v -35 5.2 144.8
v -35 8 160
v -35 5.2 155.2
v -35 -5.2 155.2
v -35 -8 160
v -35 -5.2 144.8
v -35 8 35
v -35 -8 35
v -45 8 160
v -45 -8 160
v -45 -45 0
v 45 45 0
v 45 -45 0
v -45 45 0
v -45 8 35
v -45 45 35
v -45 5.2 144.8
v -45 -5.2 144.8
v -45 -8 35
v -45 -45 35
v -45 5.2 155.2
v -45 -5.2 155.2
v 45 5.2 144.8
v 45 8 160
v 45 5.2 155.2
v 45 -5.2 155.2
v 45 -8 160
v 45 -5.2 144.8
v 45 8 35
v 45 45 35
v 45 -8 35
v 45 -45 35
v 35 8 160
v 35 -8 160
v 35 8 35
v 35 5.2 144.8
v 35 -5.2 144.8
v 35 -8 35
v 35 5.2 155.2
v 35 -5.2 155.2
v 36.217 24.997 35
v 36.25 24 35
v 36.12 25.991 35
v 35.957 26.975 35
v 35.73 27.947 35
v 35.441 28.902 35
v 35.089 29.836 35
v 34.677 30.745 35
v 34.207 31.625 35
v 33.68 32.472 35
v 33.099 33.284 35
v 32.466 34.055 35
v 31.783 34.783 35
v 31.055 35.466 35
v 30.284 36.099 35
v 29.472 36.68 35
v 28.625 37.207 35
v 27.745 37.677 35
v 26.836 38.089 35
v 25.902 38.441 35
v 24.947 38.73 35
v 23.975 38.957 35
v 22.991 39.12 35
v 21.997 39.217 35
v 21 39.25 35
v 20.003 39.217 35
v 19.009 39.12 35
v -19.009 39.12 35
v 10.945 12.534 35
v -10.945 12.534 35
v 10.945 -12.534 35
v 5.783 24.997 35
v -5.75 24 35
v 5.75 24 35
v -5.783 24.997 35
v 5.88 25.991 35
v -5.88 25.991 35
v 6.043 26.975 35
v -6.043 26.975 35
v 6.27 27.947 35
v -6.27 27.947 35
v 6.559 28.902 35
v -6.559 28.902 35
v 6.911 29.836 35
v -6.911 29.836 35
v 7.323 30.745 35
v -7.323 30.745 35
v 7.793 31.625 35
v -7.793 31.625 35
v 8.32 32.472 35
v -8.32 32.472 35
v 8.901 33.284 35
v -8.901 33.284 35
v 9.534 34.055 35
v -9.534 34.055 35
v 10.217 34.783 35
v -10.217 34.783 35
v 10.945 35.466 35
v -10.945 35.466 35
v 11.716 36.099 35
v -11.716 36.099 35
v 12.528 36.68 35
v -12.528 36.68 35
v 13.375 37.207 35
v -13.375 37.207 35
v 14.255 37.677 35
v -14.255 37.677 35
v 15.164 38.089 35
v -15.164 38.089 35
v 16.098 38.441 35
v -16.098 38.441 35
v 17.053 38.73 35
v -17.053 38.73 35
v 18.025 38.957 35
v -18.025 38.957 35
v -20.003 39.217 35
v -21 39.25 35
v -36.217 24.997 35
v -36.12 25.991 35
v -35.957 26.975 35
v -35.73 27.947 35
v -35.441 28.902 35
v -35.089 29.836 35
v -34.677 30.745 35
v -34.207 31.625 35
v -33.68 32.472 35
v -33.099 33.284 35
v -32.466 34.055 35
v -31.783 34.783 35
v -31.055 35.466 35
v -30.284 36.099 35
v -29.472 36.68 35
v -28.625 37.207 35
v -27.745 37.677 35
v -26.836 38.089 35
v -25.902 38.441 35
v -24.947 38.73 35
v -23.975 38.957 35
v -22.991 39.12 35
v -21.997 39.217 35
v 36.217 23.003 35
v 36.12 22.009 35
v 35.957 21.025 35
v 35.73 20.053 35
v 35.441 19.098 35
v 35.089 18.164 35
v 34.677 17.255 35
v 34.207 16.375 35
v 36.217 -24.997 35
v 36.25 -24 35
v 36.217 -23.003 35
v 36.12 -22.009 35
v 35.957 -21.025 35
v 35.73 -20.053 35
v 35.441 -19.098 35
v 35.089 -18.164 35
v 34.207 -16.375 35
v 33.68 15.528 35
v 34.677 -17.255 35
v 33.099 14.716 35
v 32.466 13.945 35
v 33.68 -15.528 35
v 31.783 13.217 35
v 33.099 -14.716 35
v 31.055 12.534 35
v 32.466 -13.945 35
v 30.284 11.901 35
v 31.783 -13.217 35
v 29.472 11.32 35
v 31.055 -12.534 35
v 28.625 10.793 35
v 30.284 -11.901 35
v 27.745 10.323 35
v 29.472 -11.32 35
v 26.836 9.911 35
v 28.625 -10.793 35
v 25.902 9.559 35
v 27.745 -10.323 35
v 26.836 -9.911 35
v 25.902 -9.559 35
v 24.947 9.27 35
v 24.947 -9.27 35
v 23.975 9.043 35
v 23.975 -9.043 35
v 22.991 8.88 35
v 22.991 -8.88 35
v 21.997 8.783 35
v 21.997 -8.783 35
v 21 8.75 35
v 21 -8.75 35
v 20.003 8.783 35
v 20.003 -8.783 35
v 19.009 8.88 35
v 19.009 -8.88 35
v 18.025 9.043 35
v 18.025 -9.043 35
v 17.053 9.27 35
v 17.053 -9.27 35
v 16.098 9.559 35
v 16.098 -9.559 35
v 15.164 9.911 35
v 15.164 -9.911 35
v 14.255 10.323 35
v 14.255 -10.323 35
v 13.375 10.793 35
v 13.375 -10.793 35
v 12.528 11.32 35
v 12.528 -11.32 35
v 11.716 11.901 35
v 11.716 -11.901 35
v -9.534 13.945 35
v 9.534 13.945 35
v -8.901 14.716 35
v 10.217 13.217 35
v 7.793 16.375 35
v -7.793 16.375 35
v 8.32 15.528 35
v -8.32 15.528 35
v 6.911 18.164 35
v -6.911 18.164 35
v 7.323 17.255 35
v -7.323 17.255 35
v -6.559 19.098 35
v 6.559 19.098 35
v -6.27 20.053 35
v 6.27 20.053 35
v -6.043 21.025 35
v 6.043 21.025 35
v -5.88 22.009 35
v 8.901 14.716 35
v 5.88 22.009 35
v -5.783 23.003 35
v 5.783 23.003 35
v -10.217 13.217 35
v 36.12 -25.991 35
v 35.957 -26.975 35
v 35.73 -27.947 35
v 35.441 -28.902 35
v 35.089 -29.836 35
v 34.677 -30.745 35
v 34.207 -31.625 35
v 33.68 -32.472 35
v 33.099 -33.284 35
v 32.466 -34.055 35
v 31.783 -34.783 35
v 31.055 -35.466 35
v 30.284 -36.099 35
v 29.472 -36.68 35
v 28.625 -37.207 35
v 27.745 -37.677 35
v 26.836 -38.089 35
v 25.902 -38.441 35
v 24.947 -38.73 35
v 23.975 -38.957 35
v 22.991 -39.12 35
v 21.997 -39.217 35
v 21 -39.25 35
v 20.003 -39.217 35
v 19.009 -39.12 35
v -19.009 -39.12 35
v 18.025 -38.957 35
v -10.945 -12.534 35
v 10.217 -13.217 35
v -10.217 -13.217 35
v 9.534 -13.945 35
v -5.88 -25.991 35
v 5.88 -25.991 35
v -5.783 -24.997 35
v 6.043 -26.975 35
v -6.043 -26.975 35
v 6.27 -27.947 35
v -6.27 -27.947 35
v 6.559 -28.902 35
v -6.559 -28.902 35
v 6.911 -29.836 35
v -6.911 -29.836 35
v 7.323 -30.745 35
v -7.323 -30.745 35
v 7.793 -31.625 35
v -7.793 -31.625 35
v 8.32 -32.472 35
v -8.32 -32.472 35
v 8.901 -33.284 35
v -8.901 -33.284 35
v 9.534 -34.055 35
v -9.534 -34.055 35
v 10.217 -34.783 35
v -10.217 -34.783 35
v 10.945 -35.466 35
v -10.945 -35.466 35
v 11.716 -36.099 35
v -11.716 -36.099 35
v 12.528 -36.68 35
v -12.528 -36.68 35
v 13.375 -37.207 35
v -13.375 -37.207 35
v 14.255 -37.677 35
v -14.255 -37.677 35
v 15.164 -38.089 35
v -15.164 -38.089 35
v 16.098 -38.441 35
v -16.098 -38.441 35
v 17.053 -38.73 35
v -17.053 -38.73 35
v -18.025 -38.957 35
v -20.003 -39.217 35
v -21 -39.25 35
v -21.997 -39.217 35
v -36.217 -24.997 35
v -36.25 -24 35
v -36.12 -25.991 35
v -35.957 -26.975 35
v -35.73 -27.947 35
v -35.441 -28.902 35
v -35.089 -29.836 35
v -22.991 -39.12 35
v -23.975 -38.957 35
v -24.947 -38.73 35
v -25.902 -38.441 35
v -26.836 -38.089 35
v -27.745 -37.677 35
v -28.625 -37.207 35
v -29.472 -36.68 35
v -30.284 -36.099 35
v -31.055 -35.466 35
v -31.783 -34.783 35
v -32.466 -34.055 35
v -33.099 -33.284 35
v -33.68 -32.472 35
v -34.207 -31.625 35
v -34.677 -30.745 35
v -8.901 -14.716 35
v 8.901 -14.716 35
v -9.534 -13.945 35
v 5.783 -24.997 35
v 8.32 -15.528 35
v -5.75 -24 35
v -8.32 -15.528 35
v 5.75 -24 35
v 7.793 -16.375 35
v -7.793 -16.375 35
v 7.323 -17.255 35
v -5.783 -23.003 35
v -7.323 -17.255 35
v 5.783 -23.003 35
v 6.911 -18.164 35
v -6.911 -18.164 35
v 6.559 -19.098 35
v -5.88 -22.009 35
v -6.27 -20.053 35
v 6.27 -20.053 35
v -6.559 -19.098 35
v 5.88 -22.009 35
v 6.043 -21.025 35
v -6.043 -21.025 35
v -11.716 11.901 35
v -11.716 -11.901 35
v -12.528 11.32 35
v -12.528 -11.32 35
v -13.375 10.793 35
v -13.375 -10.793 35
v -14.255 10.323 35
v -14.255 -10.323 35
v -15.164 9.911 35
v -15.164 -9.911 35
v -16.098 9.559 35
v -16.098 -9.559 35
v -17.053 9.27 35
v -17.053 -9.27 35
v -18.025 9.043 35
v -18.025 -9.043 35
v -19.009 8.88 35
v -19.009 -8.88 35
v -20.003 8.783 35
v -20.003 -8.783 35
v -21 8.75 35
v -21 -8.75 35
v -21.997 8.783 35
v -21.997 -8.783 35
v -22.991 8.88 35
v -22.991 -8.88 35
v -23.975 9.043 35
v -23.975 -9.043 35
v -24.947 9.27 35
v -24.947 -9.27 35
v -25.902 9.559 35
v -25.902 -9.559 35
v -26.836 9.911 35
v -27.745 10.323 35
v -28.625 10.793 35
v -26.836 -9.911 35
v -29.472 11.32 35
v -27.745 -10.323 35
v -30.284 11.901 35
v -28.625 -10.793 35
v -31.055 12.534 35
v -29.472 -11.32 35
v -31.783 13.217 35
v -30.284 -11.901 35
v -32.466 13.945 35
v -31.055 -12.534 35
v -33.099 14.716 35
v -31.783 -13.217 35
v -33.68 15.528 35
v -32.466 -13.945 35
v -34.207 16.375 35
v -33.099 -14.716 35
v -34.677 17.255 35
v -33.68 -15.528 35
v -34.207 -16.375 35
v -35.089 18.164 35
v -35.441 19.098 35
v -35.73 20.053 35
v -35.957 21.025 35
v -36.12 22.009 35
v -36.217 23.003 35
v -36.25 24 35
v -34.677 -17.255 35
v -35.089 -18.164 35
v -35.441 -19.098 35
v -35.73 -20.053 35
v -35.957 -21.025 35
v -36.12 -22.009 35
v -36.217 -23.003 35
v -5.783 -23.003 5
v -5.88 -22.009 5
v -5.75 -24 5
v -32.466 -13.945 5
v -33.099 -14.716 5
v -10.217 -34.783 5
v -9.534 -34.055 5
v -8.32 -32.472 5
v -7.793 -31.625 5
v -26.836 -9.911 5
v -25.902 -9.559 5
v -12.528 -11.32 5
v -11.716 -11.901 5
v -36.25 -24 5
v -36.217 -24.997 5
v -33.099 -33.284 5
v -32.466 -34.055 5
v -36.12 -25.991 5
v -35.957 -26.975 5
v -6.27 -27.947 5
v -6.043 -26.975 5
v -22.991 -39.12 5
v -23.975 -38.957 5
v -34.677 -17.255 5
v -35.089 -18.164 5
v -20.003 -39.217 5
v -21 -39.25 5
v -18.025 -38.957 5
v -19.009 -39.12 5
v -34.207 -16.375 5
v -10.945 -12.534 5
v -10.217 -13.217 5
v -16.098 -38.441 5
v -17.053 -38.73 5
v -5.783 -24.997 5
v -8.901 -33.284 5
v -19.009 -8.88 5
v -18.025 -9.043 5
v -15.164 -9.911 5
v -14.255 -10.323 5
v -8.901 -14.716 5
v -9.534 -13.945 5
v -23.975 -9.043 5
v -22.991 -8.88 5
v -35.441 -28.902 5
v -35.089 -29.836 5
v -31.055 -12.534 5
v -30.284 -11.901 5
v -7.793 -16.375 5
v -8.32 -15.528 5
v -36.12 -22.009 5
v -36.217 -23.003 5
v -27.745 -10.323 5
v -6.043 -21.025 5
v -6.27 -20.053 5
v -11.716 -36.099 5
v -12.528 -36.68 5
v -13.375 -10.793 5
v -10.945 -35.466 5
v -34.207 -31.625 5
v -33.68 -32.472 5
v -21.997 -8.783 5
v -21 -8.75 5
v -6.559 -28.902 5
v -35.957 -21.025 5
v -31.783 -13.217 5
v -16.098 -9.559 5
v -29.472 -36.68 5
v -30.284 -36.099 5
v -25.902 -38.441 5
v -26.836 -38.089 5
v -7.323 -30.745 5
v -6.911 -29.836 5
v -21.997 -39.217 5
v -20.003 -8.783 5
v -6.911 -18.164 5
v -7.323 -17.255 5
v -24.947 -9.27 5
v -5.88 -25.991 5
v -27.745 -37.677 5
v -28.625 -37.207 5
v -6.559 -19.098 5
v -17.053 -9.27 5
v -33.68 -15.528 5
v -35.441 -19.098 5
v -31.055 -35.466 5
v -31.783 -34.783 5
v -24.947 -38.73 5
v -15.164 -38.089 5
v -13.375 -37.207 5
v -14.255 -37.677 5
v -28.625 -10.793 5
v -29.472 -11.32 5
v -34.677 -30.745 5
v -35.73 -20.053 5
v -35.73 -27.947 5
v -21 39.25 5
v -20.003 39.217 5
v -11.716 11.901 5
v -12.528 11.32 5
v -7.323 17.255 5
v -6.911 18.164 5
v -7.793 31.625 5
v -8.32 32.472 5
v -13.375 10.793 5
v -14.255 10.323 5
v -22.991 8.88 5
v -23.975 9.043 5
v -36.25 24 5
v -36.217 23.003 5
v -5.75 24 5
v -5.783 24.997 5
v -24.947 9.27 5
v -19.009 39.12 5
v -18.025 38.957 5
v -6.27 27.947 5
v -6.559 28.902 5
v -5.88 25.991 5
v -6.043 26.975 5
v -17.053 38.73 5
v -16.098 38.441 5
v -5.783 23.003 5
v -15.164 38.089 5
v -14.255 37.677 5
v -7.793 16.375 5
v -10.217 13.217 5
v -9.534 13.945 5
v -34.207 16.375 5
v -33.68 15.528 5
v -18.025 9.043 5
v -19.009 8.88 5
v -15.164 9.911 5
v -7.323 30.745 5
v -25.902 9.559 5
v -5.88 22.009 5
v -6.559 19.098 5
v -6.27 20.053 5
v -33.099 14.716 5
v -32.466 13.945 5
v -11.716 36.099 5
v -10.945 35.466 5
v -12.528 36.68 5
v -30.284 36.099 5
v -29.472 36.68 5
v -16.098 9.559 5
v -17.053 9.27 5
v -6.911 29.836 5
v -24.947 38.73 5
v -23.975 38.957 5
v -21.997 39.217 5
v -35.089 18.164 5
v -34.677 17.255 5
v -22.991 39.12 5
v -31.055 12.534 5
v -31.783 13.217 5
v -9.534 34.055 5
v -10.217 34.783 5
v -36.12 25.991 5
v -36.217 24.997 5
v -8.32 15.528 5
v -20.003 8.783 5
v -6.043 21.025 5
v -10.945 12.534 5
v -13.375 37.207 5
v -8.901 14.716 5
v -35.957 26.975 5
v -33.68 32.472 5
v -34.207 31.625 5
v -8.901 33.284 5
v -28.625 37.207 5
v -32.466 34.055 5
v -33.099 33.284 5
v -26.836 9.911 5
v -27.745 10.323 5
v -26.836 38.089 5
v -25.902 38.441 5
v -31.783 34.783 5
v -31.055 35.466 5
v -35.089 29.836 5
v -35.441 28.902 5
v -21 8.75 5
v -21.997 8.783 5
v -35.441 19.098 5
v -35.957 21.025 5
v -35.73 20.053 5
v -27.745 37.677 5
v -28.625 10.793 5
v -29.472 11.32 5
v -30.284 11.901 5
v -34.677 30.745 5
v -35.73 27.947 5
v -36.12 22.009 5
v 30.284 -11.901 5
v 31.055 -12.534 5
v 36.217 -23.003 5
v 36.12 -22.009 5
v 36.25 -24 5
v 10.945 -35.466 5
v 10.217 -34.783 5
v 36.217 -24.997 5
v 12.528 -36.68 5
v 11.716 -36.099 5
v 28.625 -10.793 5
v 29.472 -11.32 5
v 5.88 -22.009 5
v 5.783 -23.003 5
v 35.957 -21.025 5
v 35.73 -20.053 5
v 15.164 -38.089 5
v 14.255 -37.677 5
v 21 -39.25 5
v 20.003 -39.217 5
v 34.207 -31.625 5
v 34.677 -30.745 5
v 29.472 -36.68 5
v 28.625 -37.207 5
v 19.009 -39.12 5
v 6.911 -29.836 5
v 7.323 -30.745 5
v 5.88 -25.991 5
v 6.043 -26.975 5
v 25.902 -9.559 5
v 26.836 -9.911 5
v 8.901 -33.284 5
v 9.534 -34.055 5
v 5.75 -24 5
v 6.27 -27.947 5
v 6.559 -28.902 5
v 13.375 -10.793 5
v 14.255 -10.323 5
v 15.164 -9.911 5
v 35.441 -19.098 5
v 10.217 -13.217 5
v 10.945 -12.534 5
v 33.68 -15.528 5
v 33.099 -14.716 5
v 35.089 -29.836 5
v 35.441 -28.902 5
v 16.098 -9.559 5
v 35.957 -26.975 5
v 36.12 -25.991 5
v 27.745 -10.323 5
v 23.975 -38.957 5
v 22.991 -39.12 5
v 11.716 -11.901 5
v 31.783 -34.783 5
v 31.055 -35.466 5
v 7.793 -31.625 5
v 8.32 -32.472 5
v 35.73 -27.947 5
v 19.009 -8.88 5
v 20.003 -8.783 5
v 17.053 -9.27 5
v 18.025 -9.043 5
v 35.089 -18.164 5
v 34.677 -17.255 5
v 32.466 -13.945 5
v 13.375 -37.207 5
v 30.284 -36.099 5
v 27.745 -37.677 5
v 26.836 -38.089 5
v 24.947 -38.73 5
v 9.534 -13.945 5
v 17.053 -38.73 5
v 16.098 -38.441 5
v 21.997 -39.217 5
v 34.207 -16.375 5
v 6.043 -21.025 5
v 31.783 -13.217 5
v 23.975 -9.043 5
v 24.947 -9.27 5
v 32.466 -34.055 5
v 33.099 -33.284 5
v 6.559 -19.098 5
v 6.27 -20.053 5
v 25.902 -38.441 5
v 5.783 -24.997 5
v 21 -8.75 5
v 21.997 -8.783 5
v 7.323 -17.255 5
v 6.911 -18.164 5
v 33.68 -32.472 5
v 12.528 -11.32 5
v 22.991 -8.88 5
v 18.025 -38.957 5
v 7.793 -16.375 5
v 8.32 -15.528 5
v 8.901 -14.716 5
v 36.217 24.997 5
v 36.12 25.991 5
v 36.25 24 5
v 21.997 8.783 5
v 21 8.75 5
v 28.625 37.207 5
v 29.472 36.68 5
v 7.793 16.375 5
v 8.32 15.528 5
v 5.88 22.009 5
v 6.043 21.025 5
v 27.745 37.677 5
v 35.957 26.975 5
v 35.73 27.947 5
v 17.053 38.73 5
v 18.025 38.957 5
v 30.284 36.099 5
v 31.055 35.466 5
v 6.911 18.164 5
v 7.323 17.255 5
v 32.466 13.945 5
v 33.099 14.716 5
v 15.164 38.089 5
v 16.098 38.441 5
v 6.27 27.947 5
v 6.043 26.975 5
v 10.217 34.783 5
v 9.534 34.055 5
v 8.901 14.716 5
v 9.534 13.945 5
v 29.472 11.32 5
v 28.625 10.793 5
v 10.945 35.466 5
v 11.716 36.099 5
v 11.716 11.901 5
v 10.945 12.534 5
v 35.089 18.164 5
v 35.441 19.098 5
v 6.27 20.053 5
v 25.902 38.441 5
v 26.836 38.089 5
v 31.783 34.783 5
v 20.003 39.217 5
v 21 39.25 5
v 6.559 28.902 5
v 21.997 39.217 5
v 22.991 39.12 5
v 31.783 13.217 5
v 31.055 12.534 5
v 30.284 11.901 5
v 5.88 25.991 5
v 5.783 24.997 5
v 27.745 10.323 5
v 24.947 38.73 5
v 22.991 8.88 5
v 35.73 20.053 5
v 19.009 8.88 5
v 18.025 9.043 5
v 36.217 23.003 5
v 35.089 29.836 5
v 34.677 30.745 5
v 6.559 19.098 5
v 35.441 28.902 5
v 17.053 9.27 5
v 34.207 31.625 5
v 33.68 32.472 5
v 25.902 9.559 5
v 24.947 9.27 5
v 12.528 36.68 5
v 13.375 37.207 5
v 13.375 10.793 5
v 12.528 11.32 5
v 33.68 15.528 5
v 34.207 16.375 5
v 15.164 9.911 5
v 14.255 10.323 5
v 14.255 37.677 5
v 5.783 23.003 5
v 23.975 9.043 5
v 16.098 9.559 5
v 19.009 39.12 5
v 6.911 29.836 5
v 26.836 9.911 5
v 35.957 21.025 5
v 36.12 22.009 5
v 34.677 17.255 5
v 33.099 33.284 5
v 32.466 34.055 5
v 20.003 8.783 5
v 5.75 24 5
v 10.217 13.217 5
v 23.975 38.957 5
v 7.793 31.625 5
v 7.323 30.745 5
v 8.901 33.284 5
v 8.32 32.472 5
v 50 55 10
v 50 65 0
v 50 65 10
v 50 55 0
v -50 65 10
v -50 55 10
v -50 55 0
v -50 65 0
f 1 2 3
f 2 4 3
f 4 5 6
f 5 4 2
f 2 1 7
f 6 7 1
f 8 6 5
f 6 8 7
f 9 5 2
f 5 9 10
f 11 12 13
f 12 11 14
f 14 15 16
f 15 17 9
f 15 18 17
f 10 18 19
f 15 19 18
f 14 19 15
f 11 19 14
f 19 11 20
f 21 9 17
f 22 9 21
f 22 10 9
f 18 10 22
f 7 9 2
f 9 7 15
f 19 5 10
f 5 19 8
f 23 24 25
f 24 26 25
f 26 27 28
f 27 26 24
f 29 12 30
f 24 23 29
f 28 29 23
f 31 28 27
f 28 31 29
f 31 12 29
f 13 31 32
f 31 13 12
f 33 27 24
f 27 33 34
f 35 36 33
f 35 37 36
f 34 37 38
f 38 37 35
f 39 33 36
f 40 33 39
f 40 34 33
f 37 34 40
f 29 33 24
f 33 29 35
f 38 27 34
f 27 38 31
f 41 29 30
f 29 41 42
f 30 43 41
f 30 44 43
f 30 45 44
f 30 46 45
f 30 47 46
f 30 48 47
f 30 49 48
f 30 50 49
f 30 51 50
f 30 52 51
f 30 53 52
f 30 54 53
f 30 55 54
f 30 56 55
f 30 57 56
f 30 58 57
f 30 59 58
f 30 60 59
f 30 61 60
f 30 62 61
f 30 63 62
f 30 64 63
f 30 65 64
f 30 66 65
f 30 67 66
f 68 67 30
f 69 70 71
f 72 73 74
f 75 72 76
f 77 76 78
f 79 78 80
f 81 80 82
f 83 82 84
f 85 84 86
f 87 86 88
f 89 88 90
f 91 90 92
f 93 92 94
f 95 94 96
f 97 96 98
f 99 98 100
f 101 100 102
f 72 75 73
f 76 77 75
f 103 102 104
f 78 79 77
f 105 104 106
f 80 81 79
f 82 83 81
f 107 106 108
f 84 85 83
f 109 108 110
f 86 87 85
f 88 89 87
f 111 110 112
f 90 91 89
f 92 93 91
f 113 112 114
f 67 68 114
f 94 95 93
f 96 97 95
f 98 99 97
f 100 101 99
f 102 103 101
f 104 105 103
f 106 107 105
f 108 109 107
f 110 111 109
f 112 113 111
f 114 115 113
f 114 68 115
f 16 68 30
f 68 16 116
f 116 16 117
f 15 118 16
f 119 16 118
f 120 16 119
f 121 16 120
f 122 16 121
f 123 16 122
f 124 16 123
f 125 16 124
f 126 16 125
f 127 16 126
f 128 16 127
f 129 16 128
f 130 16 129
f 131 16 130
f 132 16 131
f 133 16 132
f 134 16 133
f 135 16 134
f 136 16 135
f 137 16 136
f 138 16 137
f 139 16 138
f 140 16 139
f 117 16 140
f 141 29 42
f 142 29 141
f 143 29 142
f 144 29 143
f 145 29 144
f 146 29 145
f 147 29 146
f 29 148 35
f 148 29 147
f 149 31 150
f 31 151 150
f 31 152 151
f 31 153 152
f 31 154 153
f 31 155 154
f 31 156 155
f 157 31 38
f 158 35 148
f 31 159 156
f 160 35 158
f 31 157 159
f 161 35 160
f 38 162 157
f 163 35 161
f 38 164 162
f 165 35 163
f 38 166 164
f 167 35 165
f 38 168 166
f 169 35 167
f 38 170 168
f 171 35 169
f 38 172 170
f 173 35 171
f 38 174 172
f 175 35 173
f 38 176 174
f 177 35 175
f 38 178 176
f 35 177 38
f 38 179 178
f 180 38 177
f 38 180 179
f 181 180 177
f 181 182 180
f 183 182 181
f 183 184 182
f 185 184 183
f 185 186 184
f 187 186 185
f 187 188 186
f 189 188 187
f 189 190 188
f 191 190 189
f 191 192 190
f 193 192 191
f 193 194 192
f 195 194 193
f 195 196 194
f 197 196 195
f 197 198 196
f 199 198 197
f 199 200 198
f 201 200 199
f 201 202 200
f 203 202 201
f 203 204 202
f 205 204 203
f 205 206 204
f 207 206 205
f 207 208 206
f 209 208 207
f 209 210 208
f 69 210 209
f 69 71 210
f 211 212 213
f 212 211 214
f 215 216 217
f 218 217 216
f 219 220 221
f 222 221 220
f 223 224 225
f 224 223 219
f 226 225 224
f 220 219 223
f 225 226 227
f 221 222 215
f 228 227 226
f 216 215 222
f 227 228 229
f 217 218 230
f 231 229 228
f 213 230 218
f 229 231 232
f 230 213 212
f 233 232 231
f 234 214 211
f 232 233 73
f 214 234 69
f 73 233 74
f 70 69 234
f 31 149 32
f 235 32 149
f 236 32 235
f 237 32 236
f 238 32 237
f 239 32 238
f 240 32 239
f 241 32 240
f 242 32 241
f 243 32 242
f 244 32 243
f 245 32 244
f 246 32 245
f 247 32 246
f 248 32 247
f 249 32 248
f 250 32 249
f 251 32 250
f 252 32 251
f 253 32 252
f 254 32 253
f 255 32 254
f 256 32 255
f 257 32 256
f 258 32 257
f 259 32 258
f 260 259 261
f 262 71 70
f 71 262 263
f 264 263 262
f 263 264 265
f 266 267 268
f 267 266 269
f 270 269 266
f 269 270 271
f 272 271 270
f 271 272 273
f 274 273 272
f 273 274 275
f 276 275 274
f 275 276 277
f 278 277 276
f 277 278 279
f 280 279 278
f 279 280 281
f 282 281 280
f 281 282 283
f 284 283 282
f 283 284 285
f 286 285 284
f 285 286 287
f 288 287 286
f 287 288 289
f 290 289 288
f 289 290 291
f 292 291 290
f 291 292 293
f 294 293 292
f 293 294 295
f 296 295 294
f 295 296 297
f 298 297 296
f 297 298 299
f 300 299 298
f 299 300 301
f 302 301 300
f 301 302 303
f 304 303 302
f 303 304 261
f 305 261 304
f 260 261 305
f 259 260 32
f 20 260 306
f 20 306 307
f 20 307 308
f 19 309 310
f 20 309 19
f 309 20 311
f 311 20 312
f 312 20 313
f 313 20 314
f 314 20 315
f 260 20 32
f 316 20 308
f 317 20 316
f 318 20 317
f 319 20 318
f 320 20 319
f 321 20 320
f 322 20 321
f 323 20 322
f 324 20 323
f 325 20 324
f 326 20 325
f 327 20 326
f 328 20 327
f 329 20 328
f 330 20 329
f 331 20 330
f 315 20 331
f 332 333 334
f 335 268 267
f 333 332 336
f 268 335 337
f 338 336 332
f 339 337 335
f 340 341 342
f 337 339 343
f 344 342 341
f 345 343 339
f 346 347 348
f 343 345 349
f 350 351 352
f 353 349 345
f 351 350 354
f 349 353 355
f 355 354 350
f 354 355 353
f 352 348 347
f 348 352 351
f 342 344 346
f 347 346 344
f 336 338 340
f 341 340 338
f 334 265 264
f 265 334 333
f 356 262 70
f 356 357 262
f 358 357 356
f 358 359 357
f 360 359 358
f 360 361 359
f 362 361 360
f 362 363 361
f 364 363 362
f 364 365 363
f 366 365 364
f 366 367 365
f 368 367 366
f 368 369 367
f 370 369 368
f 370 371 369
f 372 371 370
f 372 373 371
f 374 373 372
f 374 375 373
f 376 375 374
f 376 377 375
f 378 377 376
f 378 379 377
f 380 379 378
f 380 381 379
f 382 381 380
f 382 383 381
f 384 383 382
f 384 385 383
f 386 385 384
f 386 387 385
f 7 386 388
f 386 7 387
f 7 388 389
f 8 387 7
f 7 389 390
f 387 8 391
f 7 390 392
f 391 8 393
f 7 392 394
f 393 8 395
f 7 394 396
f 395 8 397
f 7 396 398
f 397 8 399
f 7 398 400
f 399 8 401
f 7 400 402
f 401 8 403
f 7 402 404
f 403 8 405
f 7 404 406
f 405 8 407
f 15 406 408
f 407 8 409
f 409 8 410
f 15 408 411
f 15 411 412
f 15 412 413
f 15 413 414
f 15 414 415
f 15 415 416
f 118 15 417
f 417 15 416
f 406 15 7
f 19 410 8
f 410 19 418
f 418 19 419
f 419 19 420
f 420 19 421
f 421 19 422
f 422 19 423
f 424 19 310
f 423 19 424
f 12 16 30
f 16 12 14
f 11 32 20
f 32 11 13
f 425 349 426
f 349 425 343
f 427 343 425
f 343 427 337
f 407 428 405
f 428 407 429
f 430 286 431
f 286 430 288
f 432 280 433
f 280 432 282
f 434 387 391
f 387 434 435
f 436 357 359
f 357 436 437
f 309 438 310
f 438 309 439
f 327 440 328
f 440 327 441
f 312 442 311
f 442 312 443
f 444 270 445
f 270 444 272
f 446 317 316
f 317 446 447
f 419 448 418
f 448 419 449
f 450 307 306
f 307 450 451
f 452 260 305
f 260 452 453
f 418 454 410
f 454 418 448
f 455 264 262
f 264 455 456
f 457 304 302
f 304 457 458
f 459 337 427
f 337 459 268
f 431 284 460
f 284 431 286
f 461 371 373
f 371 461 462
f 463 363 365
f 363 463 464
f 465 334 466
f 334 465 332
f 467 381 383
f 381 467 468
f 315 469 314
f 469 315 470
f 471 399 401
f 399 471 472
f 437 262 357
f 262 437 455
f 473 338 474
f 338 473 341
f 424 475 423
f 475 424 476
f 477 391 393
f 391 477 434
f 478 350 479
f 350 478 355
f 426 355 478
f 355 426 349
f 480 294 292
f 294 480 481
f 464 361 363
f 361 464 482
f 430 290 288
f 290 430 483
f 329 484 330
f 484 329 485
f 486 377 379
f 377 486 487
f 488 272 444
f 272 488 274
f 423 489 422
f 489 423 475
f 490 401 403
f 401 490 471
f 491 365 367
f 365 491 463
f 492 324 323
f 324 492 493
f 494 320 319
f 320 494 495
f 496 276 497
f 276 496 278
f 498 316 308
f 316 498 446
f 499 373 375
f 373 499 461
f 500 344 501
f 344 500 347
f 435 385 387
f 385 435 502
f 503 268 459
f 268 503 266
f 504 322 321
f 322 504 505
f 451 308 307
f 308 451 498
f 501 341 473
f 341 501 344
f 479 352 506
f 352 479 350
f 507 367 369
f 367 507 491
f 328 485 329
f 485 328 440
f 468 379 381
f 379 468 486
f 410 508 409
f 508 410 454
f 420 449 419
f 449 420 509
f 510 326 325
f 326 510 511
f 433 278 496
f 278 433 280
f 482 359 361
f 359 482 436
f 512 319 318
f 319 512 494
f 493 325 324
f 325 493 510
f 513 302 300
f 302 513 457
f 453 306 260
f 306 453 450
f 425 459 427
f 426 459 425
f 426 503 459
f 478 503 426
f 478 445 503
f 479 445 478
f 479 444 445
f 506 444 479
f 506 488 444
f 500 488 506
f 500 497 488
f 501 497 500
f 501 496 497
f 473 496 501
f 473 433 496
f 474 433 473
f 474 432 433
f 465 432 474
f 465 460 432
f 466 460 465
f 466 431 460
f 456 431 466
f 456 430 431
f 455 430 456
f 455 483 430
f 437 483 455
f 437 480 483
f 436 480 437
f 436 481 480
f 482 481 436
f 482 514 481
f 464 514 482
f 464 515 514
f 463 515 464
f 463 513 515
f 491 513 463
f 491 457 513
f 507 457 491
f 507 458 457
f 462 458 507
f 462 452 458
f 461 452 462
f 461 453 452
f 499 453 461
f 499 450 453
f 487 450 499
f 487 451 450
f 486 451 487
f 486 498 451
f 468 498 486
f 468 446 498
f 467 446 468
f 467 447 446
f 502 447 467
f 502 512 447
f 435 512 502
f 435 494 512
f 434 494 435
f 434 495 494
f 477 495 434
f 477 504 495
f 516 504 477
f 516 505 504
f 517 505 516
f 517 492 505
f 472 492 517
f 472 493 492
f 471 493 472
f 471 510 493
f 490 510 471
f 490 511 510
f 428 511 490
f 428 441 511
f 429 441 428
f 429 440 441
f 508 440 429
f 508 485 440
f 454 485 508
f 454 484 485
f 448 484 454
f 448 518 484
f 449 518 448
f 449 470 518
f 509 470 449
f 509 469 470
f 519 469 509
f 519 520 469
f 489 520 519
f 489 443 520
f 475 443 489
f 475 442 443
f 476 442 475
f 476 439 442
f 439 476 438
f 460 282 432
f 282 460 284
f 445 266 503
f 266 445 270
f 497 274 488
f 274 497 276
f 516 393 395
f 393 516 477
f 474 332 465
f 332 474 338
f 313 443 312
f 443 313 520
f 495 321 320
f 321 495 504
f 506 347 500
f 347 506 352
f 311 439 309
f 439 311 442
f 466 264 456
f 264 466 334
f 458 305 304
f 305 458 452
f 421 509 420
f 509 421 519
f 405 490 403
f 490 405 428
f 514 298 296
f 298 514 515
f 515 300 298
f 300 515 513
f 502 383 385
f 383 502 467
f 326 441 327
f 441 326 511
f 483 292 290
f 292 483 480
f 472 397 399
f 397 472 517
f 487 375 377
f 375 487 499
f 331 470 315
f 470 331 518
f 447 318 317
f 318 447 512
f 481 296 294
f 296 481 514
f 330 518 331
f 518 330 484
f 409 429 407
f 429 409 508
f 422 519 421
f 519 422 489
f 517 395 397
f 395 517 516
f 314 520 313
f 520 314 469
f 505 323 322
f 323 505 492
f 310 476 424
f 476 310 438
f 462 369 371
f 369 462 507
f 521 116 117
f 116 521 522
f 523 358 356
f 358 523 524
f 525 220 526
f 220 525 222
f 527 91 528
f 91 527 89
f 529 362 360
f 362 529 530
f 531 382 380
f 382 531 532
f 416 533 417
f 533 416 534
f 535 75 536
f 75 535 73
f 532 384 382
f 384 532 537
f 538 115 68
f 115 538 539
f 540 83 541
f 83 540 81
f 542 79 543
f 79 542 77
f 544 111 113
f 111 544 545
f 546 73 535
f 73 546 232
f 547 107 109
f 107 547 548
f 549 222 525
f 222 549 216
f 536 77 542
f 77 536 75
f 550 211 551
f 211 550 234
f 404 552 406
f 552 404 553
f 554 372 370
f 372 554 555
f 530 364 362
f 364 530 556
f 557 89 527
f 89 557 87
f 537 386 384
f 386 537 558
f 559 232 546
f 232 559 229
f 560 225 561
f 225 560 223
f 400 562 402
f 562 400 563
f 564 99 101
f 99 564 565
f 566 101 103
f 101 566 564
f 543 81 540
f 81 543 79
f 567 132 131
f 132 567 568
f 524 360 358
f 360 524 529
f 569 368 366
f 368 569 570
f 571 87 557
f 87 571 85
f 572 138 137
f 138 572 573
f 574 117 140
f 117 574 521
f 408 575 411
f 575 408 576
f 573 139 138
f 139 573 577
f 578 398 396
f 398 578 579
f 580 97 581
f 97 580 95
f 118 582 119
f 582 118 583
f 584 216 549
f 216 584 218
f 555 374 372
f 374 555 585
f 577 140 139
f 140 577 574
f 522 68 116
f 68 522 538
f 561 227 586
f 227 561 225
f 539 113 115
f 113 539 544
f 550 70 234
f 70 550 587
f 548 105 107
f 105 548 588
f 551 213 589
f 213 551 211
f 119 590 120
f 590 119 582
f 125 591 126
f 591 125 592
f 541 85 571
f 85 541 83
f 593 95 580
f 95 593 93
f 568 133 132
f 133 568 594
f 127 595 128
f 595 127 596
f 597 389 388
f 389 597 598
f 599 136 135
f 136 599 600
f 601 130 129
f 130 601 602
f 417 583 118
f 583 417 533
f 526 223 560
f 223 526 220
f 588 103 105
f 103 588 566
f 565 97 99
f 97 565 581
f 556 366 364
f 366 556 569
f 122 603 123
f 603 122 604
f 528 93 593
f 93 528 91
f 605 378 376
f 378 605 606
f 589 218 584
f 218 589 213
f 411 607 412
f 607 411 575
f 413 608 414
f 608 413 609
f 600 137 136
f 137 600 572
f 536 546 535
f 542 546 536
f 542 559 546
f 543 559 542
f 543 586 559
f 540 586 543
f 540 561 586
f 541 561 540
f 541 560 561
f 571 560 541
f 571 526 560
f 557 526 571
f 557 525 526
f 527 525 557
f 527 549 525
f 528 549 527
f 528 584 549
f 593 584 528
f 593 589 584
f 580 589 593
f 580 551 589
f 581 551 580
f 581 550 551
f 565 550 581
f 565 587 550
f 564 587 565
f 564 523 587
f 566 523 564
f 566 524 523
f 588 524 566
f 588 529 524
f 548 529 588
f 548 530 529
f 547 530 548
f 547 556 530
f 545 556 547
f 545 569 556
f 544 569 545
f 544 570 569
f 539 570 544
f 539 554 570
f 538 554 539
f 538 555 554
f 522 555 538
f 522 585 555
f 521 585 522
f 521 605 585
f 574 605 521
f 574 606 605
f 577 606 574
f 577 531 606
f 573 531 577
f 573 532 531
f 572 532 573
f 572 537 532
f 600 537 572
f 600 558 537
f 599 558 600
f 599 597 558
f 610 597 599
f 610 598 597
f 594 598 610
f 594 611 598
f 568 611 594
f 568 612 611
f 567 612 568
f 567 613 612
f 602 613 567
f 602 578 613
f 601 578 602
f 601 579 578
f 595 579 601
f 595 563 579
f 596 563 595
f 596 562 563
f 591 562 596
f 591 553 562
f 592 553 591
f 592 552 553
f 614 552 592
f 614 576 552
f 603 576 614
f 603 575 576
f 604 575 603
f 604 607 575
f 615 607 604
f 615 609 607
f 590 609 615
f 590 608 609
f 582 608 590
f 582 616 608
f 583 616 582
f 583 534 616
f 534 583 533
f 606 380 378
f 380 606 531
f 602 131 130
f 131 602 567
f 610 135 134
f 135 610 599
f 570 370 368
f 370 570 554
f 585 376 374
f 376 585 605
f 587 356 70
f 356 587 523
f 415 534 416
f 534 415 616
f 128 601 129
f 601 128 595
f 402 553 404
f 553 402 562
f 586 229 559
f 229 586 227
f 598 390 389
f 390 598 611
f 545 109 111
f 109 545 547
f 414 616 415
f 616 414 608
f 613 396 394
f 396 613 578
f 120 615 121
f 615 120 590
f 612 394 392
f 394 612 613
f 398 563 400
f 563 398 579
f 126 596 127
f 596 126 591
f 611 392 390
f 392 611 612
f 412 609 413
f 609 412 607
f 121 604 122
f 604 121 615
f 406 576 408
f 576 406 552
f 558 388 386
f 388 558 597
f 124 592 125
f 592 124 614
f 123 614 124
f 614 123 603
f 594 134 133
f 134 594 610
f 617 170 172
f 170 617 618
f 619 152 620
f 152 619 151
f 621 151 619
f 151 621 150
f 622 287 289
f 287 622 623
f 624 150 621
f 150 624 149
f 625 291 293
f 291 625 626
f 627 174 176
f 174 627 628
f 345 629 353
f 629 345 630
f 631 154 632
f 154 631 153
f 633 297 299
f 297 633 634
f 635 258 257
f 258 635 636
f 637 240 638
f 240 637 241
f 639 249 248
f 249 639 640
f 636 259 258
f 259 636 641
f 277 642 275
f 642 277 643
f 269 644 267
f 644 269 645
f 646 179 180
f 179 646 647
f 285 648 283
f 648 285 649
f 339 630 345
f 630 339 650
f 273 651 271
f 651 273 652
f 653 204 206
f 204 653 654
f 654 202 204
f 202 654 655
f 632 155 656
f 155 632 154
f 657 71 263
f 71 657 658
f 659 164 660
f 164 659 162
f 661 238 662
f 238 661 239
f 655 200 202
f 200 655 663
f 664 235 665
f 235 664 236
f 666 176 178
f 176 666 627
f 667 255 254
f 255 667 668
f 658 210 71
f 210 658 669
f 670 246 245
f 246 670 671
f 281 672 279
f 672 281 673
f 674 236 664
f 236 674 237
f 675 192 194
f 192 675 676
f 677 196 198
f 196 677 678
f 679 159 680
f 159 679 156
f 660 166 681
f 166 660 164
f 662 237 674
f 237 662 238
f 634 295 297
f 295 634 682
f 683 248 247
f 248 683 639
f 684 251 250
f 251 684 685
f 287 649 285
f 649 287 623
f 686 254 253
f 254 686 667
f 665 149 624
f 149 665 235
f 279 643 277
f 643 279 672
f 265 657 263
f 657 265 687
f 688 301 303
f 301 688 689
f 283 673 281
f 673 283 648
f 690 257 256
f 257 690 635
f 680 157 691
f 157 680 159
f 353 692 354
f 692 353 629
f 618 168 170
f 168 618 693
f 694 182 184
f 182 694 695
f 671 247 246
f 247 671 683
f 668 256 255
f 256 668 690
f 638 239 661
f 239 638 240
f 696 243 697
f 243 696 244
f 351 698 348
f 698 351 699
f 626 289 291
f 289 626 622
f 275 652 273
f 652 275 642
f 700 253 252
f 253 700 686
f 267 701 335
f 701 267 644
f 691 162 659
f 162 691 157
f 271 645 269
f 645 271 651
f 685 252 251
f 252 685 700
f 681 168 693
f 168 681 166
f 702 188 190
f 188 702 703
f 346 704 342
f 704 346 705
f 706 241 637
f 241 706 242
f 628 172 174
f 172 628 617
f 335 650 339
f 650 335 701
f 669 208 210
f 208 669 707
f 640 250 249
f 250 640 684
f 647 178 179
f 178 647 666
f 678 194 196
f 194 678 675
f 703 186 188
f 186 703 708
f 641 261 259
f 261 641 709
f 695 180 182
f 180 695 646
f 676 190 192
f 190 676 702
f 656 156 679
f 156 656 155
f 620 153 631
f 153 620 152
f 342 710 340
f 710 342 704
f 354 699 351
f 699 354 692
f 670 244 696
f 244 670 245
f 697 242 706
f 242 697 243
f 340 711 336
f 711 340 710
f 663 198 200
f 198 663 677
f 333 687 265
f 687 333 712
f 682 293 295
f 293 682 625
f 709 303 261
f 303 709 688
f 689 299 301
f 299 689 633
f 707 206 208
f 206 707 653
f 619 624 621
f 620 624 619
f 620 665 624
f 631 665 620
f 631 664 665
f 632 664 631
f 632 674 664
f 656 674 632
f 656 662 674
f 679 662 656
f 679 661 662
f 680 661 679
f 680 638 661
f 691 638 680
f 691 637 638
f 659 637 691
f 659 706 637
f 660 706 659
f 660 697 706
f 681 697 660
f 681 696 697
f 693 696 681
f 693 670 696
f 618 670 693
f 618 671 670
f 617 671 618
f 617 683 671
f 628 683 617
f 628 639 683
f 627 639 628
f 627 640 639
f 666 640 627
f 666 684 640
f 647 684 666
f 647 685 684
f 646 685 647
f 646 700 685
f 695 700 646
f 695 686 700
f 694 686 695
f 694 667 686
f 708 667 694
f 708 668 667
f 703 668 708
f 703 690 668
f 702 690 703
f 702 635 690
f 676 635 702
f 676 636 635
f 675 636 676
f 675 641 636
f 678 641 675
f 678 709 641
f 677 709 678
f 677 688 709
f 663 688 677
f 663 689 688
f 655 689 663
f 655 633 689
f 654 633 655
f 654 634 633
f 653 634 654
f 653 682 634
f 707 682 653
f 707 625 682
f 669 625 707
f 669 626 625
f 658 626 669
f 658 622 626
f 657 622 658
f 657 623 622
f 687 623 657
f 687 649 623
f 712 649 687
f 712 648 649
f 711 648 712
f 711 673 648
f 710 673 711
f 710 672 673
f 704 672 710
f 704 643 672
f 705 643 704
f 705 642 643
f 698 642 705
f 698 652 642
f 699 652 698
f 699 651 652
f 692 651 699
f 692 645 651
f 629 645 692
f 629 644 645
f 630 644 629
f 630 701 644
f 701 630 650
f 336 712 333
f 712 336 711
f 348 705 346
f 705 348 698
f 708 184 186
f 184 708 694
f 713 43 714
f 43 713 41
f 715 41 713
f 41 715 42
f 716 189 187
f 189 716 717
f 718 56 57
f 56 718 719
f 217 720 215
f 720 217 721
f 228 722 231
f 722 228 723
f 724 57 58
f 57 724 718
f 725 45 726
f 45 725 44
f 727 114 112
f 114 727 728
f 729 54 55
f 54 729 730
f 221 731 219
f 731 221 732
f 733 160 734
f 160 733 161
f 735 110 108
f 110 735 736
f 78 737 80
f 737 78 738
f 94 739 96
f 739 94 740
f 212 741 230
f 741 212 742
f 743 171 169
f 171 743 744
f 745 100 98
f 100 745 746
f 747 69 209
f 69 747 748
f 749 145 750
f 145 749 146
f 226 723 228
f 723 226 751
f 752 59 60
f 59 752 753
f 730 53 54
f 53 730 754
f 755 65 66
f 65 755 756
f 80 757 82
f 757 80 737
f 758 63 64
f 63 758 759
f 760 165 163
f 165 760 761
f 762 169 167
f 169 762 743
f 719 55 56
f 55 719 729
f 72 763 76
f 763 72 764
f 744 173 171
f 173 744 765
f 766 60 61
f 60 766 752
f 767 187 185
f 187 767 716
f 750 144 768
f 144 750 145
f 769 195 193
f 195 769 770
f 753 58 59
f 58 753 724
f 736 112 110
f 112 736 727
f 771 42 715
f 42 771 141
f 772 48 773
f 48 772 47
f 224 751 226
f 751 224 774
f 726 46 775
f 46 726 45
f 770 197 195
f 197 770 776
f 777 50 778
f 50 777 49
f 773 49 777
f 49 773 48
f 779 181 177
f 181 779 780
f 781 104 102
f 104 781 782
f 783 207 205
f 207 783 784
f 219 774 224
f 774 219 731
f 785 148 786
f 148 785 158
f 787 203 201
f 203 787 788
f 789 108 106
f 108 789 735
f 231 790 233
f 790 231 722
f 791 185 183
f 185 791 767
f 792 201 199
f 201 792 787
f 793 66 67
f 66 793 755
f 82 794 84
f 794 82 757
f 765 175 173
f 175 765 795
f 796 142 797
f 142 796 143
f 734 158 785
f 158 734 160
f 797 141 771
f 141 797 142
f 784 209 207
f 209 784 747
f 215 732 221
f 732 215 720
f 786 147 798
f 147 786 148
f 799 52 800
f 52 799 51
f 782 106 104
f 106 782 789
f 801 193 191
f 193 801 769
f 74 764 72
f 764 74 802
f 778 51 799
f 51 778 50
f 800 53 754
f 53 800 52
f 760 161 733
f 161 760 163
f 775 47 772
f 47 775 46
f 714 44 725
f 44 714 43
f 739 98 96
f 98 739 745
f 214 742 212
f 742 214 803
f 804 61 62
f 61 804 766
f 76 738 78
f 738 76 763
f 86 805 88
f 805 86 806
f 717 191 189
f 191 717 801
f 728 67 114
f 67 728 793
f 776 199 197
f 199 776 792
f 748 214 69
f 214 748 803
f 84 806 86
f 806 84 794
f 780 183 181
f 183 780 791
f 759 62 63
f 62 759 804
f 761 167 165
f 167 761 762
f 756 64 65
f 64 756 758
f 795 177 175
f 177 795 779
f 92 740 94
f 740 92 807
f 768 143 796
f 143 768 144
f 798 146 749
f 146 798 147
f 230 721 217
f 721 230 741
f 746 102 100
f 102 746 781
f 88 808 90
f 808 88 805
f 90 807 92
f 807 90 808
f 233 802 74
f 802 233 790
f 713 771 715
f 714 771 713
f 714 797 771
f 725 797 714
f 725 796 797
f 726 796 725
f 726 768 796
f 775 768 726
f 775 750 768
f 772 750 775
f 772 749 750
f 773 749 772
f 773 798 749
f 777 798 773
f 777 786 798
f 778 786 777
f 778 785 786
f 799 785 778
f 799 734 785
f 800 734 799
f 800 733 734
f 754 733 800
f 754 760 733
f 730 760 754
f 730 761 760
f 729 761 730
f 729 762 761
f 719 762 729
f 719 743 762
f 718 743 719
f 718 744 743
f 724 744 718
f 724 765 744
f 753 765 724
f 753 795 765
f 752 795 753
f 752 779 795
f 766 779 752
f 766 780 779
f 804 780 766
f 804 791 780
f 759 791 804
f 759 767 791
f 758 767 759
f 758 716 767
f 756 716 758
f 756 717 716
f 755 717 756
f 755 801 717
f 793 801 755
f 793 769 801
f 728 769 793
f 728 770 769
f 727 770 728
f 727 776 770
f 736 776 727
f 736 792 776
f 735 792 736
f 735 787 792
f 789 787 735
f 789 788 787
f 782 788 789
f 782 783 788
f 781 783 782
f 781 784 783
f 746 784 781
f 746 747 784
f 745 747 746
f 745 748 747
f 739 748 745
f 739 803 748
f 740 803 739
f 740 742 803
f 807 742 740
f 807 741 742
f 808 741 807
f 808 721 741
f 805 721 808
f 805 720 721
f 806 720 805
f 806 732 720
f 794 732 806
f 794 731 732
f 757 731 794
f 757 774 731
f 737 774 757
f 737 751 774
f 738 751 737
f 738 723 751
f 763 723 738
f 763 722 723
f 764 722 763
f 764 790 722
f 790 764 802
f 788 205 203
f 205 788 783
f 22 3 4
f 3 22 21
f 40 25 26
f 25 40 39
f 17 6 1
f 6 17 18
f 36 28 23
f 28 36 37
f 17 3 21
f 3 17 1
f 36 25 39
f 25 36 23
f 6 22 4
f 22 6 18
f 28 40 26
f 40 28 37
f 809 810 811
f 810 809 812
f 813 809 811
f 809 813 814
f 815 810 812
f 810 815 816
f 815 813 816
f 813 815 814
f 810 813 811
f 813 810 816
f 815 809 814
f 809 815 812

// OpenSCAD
// Four-tube 50 mL conical carrier with push-through handle
// Two parts printed side by side: base with posts, and square handle bar

$fn = 96;

// ---------- Base block ----------
base_x      = 90;    // base length (X)
base_y      = 90;    // base width (Y)
base_h      = 35;    // base height (Z)

// ---------- Tube seats ----------
seat_d      = 30.5;  // seat diameter for 50 mL conical
seat_depth  = 30;    // blind seat depth (leaves 5 mm floor)
seat_x      = 21;    // seat centre offset in X (+/-)
seat_y      = 24;    // seat centre offset in Y (+/-)

// ---------- Posts ----------
post_t      = 10;    // post thickness (X)
post_w      = 16;    // post width (Y)
post_top    = 160;   // post top height (Z)

// ---------- Handle slot in posts ----------
slot_s      = 10.4;  // square through-hole size
slot_z      = 150;   // slot centre height

// ---------- Handle bar ----------
bar_s       = 10;    // bar cross-section (square)
bar_len     = 100;   // bar length (X)
bar_y0      = 55;    // bar near edge Y (10 mm gap to base +Y face)

eps         = 0.5;   // cutting overlap

// ================= Part 1: base with posts =================
module base_part() {
    difference() {
        union() {
            // base block
            translate([-base_x/2, -base_y/2, 0])
                cube([base_x, base_y, base_h]);
            // posts at both X ends, flush with end faces
            for (sx = [-1, 1])
                translate([sx > 0 ? base_x/2 - post_t : -base_x/2,
                           -post_w/2, 0])
                    cube([post_t, post_w, post_top]);
        }
        // four blind tube seats
        for (ix = [-1, 1], iy = [-1, 1])
            translate([ix*seat_x, iy*seat_y, base_h - seat_depth])
                cylinder(d = seat_d, h = seat_depth + eps);
        // square handle hole straight through both posts along X
        translate([-base_x/2 - eps, -slot_s/2, slot_z - slot_s/2])
            cube([base_x + 2*eps, slot_s, slot_s]);
    }
}

// ================= Part 2: handle bar =================
module handle_part() {
    translate([-bar_len/2, bar_y0, 0])
        cube([bar_len, bar_s, bar_s]);
}

base_part();
handle_part();
